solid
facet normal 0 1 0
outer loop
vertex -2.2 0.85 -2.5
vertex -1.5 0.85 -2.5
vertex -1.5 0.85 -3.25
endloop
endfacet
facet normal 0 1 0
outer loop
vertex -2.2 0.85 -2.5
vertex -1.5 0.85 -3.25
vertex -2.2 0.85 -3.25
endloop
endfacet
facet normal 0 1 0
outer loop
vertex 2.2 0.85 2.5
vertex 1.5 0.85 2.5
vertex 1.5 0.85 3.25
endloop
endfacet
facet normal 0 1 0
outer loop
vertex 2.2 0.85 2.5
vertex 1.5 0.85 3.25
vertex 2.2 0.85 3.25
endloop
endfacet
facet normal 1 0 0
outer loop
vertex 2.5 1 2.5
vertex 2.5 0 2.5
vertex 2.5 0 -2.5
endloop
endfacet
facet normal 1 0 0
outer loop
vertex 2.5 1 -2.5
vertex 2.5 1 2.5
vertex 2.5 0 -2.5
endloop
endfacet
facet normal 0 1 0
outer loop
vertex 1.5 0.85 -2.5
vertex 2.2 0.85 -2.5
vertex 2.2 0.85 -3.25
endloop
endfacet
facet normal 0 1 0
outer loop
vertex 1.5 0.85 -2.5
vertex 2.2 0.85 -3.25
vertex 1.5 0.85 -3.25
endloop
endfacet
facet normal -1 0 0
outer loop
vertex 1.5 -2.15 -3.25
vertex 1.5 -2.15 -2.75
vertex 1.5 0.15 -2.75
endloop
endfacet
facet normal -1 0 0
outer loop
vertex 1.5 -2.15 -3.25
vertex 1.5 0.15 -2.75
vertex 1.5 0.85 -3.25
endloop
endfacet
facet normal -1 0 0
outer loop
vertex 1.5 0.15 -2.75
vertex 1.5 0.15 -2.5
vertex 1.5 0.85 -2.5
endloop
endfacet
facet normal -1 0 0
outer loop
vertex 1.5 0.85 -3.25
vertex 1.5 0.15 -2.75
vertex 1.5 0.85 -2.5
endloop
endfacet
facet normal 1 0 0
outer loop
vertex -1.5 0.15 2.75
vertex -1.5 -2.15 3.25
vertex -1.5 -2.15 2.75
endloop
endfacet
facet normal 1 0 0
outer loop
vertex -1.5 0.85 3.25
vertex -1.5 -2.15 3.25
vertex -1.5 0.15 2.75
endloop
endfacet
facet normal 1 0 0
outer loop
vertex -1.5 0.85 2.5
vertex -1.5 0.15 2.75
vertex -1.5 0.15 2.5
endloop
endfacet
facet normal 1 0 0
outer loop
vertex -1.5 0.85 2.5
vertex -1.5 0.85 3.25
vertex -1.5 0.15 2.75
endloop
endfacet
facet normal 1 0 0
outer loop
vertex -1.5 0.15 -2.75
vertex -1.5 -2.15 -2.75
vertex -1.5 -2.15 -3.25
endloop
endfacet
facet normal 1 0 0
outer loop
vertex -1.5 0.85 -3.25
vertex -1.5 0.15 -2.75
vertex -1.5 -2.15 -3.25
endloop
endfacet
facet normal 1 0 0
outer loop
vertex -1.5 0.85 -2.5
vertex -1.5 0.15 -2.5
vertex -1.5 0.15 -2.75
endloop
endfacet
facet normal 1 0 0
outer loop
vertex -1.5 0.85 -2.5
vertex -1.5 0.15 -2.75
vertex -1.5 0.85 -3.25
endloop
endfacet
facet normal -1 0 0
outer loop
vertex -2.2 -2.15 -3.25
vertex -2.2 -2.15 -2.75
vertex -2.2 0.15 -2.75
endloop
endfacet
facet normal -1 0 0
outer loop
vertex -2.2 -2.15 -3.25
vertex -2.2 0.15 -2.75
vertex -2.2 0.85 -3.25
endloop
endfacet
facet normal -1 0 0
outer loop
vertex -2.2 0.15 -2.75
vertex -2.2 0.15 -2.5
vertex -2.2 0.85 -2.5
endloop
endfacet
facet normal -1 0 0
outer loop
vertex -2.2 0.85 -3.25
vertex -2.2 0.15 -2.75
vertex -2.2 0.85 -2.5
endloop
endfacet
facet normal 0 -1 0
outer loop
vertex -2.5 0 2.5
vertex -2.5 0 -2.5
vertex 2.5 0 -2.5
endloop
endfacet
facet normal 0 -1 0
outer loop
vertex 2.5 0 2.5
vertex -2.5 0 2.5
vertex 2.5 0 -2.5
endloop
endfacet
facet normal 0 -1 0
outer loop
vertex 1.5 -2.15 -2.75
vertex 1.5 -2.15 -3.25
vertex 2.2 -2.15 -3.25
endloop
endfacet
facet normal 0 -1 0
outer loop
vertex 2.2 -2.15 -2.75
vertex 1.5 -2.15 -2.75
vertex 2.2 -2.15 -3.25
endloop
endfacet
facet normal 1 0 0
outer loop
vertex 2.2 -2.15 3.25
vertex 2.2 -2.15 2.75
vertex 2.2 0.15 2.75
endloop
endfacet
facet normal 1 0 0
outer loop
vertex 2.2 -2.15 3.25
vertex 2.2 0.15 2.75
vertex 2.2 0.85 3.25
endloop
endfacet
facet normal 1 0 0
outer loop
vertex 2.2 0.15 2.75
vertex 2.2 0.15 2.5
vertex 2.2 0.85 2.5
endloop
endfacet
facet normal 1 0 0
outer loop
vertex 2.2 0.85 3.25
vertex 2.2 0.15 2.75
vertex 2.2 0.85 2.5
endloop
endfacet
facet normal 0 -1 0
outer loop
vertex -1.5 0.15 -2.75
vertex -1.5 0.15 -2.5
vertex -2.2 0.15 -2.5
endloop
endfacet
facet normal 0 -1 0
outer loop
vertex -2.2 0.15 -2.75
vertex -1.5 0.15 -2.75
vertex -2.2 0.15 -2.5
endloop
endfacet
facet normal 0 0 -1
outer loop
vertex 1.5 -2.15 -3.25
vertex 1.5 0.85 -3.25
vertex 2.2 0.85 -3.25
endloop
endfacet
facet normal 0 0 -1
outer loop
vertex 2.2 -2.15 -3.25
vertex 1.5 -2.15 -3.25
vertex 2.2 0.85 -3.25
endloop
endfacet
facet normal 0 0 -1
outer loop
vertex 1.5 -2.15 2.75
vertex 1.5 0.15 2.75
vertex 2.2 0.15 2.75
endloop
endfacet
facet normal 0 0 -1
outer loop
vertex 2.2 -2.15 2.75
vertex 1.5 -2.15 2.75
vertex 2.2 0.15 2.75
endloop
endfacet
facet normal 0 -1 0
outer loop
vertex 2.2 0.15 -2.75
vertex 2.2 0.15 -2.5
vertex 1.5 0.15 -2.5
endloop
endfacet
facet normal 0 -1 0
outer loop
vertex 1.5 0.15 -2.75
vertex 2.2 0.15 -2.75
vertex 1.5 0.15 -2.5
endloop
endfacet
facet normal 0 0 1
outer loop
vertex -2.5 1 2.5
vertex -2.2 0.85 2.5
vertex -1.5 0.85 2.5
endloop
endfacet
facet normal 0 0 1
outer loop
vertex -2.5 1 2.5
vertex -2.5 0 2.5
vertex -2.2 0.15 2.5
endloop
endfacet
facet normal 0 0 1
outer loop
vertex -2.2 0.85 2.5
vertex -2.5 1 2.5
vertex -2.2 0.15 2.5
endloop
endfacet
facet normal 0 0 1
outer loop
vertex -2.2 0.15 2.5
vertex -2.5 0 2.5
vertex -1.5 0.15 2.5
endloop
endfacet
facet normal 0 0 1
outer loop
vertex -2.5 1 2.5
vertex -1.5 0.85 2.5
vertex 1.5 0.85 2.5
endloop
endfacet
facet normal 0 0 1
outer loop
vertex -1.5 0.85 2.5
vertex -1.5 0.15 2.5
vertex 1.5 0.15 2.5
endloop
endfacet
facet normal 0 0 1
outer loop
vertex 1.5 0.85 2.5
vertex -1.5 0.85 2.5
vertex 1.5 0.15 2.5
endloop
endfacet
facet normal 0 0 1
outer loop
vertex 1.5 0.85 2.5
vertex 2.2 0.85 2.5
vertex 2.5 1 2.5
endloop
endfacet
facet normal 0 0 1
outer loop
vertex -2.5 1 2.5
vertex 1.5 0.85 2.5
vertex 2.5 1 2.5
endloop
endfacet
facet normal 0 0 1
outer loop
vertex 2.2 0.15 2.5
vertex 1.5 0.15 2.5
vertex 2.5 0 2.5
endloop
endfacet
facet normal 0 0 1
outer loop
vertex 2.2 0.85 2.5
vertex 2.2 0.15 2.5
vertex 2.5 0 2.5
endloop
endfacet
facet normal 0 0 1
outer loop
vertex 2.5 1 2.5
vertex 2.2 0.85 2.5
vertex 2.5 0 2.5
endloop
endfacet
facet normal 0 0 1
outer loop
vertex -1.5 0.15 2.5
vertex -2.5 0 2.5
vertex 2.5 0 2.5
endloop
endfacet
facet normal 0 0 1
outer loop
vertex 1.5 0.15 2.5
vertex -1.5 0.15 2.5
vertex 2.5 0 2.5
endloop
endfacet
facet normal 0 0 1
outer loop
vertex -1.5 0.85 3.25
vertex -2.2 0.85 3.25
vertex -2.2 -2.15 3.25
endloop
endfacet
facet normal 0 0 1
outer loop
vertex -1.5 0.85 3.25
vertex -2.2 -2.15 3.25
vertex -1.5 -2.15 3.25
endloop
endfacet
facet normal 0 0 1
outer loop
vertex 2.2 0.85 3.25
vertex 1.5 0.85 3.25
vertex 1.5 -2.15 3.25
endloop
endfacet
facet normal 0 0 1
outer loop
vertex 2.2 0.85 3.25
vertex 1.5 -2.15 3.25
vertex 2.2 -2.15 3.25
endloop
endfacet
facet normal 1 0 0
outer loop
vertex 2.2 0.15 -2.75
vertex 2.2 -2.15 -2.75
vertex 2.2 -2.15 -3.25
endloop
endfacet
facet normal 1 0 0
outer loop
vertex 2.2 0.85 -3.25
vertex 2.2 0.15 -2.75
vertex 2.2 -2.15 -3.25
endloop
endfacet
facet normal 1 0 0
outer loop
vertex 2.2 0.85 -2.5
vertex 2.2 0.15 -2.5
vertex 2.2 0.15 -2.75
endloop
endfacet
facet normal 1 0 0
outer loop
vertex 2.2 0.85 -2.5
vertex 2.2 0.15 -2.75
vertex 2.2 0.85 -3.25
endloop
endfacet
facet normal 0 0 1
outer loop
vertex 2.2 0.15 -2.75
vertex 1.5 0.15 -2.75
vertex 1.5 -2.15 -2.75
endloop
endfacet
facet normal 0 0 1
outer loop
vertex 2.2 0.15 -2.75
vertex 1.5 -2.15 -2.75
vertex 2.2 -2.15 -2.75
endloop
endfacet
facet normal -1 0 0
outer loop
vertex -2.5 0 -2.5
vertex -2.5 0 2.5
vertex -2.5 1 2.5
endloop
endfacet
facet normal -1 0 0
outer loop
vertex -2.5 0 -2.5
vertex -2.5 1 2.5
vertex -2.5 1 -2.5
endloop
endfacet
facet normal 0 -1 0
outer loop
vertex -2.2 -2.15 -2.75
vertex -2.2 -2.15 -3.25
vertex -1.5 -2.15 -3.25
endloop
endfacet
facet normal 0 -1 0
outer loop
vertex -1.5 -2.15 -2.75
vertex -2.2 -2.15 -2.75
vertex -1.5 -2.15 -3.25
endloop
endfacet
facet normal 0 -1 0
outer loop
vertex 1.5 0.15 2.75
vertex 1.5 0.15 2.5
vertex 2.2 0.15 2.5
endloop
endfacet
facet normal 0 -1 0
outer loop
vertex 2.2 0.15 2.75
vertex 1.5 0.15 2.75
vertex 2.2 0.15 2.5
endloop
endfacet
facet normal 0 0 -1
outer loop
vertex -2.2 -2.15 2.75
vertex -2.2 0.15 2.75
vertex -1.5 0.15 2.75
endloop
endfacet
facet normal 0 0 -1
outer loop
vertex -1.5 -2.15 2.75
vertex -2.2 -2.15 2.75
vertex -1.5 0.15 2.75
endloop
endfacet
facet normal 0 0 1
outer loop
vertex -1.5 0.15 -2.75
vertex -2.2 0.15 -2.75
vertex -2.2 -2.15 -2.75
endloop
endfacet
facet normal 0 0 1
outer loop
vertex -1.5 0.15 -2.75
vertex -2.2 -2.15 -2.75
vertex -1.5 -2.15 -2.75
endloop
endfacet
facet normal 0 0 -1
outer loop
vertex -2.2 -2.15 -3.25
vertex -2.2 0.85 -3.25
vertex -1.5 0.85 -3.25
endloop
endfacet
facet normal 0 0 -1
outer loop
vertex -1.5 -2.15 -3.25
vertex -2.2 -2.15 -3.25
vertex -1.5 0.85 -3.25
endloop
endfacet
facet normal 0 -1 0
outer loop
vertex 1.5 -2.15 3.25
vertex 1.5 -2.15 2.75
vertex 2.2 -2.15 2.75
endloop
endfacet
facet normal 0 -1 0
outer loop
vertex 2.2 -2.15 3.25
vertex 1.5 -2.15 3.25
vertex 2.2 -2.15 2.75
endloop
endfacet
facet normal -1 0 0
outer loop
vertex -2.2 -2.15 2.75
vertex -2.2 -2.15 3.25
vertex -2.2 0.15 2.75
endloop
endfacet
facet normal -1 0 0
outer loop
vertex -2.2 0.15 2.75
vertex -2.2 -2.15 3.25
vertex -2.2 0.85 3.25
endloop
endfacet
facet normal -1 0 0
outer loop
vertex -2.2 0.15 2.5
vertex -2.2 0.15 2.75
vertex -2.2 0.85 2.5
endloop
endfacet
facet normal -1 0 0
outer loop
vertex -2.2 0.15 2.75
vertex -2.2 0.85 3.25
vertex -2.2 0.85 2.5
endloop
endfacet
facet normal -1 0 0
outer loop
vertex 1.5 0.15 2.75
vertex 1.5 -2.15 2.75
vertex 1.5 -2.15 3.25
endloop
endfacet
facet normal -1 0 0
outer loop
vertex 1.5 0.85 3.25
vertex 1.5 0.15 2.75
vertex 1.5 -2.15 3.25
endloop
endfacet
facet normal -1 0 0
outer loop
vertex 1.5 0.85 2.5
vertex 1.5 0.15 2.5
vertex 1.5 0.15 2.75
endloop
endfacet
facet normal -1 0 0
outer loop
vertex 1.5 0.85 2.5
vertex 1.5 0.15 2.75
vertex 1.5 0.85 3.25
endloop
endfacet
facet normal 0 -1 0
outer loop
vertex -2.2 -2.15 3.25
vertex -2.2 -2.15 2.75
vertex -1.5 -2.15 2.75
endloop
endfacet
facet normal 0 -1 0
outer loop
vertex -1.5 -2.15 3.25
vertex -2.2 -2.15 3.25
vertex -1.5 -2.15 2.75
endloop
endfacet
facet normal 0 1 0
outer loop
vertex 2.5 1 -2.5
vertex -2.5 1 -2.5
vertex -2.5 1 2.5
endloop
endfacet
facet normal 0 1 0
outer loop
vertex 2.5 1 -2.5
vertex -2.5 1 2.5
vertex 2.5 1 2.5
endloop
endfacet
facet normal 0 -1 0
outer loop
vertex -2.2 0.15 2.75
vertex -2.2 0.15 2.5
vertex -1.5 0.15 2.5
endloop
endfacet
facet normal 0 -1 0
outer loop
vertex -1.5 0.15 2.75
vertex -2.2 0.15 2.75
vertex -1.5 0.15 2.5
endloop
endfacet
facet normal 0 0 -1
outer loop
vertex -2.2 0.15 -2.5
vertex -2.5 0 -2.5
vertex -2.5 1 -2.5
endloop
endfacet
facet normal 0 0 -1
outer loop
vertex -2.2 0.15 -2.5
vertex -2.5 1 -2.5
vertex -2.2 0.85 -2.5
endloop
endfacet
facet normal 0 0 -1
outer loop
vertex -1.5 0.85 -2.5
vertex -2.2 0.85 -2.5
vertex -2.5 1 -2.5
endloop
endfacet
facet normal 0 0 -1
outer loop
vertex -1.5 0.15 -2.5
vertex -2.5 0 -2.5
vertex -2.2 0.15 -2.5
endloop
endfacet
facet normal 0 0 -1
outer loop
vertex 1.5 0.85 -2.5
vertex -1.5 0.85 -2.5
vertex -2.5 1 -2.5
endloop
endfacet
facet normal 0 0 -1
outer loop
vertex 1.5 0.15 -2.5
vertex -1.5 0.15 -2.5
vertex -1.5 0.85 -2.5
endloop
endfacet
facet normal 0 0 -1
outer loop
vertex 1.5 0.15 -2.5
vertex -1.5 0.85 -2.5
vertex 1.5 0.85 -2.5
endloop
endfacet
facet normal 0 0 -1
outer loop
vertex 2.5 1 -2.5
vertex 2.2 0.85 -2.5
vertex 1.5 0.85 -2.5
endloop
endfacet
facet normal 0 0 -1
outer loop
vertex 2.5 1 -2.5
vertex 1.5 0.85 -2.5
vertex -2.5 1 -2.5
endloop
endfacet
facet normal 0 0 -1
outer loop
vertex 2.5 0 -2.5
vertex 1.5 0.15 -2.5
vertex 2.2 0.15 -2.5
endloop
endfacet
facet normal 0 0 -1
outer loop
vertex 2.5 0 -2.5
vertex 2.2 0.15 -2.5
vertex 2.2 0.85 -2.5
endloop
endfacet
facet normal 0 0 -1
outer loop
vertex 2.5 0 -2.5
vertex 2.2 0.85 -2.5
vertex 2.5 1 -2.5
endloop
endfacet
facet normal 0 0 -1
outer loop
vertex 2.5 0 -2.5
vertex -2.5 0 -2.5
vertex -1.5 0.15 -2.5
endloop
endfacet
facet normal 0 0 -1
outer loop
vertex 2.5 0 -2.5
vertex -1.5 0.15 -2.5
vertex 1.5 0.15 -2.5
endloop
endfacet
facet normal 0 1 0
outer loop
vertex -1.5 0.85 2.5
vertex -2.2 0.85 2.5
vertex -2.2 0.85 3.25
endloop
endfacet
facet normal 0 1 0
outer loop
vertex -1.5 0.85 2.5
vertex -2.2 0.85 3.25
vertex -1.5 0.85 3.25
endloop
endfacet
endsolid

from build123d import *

# Parameters (mm, degrees)
SKETCH1_W           = 5
SKETCH1_H           = 5
BOSS_EXTRUDE1_DEPTH = 1
SKETCH2_W           = 0.7
SKETCH2_H           = 0.7
BOSS_EXTRUDE2_DEPTH = 0.5
SKETCH7_W           = 0.7
SKETCH7_H           = 0.5
BOSS_EXTRUDE3_DEPTH = 3
SKETCH8_W           = 0.7
SKETCH8_H           = 0.7
BOSS_EXTRUDE4_DEPTH = 0.5
SKETCH9_W           = 0.7
SKETCH9_H           = 0.5
BOSS_EXTRUDE5_DEPTH = 3


with BuildPart() as part:
    # Sketch1 → Boss-Extrude1 (new body)
    with BuildSketch(Plane(origin=(0, 0, 0), x_dir=(1, 0, 0), z_dir=(0, 1, 0))):
        Rectangle(SKETCH1_W, SKETCH1_H)
    extrude(amount=BOSS_EXTRUDE1_DEPTH)

    # Sketch2 → Boss-Extrude2 (add)
    with BuildSketch(Plane.XY.offset(2.5)):
        with Locations((-1.85, 0.5)):
            Rectangle(SKETCH2_W, SKETCH2_H)
        with Locations((1.85, 0.5)):
            Rectangle(SKETCH2_W, SKETCH2_H)
    extrude(amount=BOSS_EXTRUDE2_DEPTH)

    # Sketch7 → Boss-Extrude3 (add)
    with BuildSketch(Plane(origin=(0, 0.85, 0), x_dir=(1, 0, 0), z_dir=(0, 1, 0))):
        with Locations((-1.85, -3)):
            Rectangle(SKETCH7_W, SKETCH7_H)
        with Locations((1.85, -3)):
            Rectangle(SKETCH7_W, SKETCH7_H)
    extrude(amount=-BOSS_EXTRUDE3_DEPTH)

    # Sketch8 → Boss-Extrude4 (add)
    with BuildSketch(Plane(origin=(0, 0, -2.5), x_dir=(-1, 0, 0), z_dir=(0, 0, -1))):
        with Locations((-1.85, 0.5)):
            Rectangle(SKETCH8_W, SKETCH8_H)
        with Locations((1.85, 0.5)):
            Rectangle(SKETCH8_W, SKETCH8_H)
    extrude(amount=BOSS_EXTRUDE4_DEPTH)

    # Sketch9 → Boss-Extrude5 (add)
    with BuildSketch(Plane(origin=(0, 0.85, 0), x_dir=(1, 0, 0), z_dir=(0, 1, 0))):
        with Locations((-1.85, 3)):
            Rectangle(SKETCH9_W, SKETCH9_H)
        with Locations((1.85, 3)):
            Rectangle(SKETCH9_W, SKETCH9_H)
    extrude(amount=-BOSS_EXTRUDE5_DEPTH)


solid = part.part
